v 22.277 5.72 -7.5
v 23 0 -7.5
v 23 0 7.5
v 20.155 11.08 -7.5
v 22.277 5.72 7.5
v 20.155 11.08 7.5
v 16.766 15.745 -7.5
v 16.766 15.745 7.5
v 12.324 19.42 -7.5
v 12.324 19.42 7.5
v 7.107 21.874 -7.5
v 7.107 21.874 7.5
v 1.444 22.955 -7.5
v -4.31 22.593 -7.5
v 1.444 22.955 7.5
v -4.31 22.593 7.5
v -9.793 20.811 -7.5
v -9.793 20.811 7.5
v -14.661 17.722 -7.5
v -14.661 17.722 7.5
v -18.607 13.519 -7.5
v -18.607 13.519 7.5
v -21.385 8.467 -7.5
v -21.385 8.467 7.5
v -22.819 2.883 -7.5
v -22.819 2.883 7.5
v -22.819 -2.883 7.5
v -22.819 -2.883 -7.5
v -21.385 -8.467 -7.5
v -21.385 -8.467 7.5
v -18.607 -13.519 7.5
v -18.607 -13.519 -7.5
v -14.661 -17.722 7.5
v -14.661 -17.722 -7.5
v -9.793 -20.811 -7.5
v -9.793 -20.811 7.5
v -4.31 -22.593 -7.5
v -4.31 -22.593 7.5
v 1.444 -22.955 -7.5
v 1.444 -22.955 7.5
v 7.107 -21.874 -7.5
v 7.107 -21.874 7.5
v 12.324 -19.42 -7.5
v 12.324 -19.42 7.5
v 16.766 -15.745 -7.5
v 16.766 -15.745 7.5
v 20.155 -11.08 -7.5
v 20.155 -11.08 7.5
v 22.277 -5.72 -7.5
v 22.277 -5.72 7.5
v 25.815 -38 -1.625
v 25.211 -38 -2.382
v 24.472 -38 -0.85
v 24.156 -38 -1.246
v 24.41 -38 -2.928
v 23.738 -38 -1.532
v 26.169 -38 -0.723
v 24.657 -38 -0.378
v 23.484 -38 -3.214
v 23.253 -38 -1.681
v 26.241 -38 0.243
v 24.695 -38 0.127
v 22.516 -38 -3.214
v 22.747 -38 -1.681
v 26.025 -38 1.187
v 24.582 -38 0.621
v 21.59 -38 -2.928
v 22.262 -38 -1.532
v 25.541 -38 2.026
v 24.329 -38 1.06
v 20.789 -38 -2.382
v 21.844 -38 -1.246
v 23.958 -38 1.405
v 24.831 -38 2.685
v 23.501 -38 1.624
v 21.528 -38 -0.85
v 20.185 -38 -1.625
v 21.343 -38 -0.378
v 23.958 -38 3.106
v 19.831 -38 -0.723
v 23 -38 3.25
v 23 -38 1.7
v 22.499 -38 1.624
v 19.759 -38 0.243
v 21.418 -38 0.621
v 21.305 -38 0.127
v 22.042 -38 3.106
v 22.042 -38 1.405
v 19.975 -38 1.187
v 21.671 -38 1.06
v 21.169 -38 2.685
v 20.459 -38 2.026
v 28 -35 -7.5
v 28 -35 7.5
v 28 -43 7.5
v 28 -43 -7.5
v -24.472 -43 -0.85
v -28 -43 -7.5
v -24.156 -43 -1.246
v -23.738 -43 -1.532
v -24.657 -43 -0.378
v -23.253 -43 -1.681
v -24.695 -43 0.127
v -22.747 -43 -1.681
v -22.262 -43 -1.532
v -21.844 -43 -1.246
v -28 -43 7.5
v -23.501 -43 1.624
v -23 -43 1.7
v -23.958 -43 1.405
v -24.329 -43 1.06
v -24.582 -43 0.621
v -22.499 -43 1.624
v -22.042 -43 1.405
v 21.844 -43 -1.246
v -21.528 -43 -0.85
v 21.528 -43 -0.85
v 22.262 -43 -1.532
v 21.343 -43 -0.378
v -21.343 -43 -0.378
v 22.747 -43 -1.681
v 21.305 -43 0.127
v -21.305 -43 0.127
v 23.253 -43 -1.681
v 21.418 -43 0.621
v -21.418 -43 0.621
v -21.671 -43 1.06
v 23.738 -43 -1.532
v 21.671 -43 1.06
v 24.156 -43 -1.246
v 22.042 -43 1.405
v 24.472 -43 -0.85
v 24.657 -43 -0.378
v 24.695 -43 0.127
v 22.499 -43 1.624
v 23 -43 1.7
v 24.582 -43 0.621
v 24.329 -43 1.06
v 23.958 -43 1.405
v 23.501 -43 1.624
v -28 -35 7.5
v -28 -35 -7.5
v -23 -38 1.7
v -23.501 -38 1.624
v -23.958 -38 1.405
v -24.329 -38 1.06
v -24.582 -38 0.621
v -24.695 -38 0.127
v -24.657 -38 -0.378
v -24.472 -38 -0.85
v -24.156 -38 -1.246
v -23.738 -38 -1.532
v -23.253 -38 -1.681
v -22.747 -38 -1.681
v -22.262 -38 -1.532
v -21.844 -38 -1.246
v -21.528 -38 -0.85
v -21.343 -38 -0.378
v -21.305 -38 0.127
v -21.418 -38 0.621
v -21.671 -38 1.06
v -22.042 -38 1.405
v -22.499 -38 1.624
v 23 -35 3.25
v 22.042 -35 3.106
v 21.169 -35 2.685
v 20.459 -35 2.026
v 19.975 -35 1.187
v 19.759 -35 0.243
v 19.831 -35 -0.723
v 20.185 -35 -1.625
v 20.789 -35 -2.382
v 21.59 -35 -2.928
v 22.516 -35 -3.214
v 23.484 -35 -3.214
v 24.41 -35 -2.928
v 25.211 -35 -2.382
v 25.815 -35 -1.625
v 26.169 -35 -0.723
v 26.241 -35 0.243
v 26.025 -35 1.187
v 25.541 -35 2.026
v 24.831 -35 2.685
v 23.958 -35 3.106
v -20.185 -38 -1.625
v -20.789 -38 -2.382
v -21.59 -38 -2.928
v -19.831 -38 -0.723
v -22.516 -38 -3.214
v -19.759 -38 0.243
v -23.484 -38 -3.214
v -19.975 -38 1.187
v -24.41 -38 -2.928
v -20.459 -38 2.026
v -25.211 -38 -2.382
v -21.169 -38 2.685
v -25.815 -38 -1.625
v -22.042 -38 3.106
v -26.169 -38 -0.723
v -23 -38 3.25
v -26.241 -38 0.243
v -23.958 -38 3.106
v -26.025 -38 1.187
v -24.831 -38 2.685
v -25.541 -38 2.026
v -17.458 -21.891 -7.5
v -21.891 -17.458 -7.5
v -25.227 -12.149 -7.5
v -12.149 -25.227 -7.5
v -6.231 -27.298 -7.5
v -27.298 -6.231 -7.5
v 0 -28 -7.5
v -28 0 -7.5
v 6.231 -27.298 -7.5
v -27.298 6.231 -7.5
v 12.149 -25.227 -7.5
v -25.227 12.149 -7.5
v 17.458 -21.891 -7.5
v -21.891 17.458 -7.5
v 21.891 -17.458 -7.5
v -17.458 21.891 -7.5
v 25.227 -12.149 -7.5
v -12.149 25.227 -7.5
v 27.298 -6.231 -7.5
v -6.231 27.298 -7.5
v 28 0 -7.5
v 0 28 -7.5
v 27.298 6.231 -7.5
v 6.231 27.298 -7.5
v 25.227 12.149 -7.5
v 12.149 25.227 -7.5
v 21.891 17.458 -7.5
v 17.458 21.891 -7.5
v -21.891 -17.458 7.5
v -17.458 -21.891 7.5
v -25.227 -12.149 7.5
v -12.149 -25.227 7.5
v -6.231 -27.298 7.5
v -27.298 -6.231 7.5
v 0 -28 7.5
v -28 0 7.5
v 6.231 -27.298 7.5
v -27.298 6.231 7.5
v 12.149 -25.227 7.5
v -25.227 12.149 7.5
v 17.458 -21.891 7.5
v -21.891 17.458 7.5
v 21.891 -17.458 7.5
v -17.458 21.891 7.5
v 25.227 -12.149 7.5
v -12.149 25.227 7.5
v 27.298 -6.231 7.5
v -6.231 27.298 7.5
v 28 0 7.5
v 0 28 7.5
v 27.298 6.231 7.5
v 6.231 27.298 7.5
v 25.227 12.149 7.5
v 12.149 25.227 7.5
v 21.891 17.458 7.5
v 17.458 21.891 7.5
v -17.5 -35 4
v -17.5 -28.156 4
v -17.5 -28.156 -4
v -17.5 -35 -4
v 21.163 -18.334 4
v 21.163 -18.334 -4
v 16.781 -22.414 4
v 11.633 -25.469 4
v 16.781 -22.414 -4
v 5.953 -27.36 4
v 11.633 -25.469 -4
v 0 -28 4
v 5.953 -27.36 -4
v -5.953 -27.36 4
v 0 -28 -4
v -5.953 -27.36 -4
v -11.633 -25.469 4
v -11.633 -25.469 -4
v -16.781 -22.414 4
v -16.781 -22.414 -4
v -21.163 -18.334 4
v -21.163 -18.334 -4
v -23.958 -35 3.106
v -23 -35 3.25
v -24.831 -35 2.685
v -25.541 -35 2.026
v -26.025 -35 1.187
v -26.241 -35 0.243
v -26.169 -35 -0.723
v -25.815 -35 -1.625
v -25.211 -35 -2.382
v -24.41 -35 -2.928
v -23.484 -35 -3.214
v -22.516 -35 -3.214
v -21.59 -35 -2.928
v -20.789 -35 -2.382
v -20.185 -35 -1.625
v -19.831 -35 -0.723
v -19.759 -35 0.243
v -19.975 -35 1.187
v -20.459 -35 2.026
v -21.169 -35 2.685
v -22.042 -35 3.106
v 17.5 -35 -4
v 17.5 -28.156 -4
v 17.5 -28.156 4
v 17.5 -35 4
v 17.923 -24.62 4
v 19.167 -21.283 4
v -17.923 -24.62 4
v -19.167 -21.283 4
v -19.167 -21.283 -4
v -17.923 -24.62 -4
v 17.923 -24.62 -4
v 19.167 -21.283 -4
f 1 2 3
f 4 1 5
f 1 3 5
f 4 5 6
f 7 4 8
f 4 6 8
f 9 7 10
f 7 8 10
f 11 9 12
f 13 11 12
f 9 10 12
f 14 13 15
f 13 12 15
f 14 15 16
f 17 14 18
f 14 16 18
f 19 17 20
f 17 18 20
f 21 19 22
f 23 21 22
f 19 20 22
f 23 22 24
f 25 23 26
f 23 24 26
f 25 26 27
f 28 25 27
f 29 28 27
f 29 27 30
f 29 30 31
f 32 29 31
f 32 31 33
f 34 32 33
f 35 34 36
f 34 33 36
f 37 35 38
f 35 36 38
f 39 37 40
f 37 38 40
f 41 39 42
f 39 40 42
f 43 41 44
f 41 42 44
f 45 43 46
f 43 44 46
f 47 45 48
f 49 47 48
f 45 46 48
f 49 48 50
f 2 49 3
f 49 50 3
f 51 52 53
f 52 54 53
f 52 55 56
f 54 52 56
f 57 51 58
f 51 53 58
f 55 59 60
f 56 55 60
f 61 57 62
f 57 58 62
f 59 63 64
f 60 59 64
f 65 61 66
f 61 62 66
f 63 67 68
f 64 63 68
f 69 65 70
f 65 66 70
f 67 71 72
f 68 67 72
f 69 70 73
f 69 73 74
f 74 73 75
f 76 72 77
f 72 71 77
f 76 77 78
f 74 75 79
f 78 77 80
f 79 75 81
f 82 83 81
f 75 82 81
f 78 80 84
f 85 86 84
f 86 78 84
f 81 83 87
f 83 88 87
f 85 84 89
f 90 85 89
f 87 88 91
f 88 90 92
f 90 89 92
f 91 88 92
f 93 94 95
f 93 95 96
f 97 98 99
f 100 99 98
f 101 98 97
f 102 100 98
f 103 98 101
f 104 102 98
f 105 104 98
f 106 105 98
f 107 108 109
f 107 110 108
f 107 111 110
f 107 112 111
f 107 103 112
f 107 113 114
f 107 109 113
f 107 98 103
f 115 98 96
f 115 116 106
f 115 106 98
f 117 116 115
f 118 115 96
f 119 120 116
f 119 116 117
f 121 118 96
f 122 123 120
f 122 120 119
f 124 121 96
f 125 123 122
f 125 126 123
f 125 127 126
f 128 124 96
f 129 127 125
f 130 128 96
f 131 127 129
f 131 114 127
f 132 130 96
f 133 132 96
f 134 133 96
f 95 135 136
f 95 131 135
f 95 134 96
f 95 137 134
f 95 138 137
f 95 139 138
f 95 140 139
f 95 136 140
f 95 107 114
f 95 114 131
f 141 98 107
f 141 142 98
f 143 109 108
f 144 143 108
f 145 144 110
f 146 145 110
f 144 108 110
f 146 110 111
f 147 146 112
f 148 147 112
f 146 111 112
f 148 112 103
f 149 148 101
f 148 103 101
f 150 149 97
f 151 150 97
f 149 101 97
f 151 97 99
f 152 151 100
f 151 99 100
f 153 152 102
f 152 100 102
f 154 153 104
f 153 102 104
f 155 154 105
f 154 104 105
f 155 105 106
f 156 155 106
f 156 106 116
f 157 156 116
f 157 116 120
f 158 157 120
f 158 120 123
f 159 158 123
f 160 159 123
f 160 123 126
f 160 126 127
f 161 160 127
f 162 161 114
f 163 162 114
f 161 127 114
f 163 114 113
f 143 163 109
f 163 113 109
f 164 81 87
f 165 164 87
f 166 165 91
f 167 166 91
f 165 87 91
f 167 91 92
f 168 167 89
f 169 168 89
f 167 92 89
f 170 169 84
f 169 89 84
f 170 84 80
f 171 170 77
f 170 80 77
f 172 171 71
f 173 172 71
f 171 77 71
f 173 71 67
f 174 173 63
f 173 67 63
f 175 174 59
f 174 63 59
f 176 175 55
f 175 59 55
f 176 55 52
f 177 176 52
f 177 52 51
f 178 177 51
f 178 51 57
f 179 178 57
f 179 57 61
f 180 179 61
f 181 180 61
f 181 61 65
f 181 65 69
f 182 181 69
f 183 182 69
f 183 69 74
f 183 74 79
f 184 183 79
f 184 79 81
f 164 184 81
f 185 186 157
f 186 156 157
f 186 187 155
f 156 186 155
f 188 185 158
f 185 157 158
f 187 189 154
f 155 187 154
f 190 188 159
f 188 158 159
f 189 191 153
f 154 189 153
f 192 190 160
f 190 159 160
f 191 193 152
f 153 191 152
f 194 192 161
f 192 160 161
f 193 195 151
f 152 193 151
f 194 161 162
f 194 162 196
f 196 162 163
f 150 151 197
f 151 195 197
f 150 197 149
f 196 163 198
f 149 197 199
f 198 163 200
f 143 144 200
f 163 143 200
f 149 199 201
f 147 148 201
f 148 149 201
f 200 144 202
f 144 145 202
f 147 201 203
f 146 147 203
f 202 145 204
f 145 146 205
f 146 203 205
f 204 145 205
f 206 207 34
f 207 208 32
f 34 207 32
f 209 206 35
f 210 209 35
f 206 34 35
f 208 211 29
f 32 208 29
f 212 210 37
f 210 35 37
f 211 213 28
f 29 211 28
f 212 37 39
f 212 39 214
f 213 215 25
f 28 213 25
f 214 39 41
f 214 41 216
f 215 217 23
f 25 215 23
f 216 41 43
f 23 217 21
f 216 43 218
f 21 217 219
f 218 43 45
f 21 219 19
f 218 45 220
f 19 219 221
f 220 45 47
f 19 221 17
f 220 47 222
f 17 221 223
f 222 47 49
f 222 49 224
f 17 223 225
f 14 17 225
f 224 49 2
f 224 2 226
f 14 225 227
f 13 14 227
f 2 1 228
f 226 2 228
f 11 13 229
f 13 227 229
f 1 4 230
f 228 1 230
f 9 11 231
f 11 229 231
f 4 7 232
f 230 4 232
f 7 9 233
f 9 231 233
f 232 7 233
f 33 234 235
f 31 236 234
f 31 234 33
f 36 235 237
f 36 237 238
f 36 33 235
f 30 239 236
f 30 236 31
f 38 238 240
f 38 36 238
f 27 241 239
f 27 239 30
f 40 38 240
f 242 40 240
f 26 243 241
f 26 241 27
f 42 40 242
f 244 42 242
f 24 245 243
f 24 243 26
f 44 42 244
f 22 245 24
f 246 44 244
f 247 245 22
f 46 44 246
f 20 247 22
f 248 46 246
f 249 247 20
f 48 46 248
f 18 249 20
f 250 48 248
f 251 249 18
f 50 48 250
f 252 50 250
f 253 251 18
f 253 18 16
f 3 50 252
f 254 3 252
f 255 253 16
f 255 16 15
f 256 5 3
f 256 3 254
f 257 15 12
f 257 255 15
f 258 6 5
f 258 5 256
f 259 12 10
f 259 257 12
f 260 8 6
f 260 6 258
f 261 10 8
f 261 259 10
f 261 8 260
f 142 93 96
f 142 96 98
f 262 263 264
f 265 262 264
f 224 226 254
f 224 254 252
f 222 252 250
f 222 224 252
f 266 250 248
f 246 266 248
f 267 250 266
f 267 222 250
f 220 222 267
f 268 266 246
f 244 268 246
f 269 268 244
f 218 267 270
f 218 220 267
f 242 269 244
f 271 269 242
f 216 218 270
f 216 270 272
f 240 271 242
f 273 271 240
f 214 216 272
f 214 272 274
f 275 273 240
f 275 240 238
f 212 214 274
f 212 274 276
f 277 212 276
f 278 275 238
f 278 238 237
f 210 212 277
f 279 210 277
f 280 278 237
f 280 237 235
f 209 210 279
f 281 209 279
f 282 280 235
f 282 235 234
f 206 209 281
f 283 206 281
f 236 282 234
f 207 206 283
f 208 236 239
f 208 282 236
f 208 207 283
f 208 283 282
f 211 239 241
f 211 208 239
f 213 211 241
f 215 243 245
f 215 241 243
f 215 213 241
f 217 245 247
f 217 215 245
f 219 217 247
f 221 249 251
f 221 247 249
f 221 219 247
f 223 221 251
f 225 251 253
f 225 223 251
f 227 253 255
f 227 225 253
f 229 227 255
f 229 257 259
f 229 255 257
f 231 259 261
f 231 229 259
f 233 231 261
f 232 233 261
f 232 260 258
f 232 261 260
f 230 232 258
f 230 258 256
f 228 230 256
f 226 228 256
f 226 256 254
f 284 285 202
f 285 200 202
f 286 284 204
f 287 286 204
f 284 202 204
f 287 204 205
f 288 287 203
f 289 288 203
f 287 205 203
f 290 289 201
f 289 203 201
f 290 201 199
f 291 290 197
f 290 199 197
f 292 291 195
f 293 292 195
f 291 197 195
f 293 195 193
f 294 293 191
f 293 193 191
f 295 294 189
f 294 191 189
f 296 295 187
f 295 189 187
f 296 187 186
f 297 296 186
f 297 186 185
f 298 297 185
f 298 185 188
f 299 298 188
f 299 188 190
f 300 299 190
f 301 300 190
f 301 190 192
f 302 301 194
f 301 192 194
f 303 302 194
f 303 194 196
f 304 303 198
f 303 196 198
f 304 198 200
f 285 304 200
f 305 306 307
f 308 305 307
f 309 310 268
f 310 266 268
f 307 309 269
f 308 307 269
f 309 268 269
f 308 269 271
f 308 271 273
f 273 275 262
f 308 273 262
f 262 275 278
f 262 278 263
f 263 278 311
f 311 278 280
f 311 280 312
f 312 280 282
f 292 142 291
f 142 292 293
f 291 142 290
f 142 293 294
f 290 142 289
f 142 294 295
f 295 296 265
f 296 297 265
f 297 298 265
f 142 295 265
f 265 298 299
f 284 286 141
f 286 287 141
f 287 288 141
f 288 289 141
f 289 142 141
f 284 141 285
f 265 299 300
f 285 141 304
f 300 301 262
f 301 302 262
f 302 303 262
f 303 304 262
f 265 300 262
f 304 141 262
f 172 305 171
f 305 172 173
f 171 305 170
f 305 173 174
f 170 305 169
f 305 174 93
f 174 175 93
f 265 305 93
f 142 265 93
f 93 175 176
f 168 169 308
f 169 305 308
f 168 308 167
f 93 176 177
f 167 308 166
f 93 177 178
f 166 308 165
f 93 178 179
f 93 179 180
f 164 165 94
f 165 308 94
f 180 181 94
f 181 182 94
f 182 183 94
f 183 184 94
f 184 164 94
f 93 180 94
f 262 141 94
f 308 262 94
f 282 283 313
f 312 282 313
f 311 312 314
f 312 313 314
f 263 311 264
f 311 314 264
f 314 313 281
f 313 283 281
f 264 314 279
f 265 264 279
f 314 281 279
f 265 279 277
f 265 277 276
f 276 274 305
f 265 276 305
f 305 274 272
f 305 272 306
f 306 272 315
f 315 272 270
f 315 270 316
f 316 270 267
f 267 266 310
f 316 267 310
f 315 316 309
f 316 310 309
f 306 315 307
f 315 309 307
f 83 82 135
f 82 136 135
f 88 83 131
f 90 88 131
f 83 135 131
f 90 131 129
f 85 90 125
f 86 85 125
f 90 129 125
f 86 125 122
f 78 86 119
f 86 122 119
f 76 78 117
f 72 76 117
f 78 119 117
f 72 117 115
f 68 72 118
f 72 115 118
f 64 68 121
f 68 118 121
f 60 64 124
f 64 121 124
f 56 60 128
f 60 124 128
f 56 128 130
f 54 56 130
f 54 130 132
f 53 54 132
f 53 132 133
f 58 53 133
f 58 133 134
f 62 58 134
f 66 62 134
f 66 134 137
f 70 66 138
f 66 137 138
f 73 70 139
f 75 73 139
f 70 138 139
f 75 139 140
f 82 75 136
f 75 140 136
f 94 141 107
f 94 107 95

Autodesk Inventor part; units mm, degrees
ref_plane "YZ Plane" through (0, 0, 0) normal (1, 0, 0) x (0, 1, 0)
ref_plane "XZ Plane" through (0, 0, 0) normal (0, 1, 0) x (-1, 0, 0)
ref_plane "XY Plane" through (0, 0, 0) normal (0, 0, 1) x (1, 0, 0)
sketch "Sketch1" plane through (0, 0, 0) normal (0, 0, 1) x (1, 0, 0)
  circle A0 centre (0, 0) radius 23
  circle A1 centre (0, 0) radius 28
  dimension "d0" = 46
  dimension "d1" = 56
extrude "Extrusion1" add sketch "Sketch1" along normal mid plane 15
sketch "Sketch2" plane through (0, 0, 0) normal (0, 1, 0) x (-1, 0, 0)
  line L0 (17.5, -4) -> (-17.5, -4)
  line L1 (-17.5, -4) -> (-17.5, 4)
  line L2 (-17.5, 4) -> (17.5, 4)
  line L3 (17.5, 4) -> (17.5, -4)
  point P0 (0, 0)
  dimension "d4" = 8
  dimension "d5" = 4
  dimension "d6" = 35
  dimension "d7" = 17.5
extrude "Extrusion2" add sketch "Sketch2" against normal blind 35
sketch "Sketch3" plane through (0, -35, 0) normal (0, -1, 0) x (1, 0, 0)
  line L0 (-28, 7.5) -> (28, 7.5)
  line L1 (28, 7.5) -> (28, -7.5)
  line L2 (28, -7.5) -> (-28, -7.5)
  line L3 (-28, -7.5) -> (-28, 7.5)
  line L4 (-17.5, -4) -> (-17.5, 4) projected
  line L5 (-17.5, 4) -> (17.5, 4) projected
  line L6 (17.5, 4) -> (17.5, -4) projected
  line L7 (17.5, -4) -> (-17.5, -4) projected
  line L8 (-28, -7.5) -> (28, -7.5) projected
  line L9 (28, 7.5) -> (-28, 7.5) projected
  point P0 (0, 0)
extrude "Extrusion3" add sketch "Sketch3" along normal blind 8 contours L0 L1 L2 L3 | L4 L5 L6 L7
sketch "Sketch4" plane through (0, 0, 7.5) normal (0, 0, 1) x (1, 0, 0)
  circle A0 centre (0, 0) radius 23 projected
extrude "Extrusion4" cut sketch "Sketch4" against normal through all
fillet "Fillet1" radius 15 2 edges at (-17.5, -21.8575, 0) (17.5, -21.8575, 0)
sketch "Sketch5" plane through (0, -35, 0) normal (0, 1, 0) x (1, 0, 0)
  line L0 (28, 7.5) -> (28, -7.5) projected
  line L1 (-28, -7.5) -> (-28, 7.5) projected
  point P0 (0, 0)
  point P1 (-23, 0)
  point P2 (23, 0)
  point P3 (28, 0)
  dimension "d15" = 5
  dimension "d16" = 5
hole "Hole1" at (-23, -35, 0) at (23, -35, 0) direction (0, -1, 0) diameter 3.4 end through all counterbore diameter 6.5 counterbore depth 3 clearance for "Socket Head Cap Screw" size "M3" standard "Ansi Metric M Profile"
equation "\"d5\" = 0.5 * d4"
equation "\"d7\" = 0.5 * d6"
equation "\"d16\" = d15"
properties part number "15528 - 40mm - 1 0.25inch Universal Plastic Pipe Clip c-w Spacer Block (PP)" material "PVC-Piping"
